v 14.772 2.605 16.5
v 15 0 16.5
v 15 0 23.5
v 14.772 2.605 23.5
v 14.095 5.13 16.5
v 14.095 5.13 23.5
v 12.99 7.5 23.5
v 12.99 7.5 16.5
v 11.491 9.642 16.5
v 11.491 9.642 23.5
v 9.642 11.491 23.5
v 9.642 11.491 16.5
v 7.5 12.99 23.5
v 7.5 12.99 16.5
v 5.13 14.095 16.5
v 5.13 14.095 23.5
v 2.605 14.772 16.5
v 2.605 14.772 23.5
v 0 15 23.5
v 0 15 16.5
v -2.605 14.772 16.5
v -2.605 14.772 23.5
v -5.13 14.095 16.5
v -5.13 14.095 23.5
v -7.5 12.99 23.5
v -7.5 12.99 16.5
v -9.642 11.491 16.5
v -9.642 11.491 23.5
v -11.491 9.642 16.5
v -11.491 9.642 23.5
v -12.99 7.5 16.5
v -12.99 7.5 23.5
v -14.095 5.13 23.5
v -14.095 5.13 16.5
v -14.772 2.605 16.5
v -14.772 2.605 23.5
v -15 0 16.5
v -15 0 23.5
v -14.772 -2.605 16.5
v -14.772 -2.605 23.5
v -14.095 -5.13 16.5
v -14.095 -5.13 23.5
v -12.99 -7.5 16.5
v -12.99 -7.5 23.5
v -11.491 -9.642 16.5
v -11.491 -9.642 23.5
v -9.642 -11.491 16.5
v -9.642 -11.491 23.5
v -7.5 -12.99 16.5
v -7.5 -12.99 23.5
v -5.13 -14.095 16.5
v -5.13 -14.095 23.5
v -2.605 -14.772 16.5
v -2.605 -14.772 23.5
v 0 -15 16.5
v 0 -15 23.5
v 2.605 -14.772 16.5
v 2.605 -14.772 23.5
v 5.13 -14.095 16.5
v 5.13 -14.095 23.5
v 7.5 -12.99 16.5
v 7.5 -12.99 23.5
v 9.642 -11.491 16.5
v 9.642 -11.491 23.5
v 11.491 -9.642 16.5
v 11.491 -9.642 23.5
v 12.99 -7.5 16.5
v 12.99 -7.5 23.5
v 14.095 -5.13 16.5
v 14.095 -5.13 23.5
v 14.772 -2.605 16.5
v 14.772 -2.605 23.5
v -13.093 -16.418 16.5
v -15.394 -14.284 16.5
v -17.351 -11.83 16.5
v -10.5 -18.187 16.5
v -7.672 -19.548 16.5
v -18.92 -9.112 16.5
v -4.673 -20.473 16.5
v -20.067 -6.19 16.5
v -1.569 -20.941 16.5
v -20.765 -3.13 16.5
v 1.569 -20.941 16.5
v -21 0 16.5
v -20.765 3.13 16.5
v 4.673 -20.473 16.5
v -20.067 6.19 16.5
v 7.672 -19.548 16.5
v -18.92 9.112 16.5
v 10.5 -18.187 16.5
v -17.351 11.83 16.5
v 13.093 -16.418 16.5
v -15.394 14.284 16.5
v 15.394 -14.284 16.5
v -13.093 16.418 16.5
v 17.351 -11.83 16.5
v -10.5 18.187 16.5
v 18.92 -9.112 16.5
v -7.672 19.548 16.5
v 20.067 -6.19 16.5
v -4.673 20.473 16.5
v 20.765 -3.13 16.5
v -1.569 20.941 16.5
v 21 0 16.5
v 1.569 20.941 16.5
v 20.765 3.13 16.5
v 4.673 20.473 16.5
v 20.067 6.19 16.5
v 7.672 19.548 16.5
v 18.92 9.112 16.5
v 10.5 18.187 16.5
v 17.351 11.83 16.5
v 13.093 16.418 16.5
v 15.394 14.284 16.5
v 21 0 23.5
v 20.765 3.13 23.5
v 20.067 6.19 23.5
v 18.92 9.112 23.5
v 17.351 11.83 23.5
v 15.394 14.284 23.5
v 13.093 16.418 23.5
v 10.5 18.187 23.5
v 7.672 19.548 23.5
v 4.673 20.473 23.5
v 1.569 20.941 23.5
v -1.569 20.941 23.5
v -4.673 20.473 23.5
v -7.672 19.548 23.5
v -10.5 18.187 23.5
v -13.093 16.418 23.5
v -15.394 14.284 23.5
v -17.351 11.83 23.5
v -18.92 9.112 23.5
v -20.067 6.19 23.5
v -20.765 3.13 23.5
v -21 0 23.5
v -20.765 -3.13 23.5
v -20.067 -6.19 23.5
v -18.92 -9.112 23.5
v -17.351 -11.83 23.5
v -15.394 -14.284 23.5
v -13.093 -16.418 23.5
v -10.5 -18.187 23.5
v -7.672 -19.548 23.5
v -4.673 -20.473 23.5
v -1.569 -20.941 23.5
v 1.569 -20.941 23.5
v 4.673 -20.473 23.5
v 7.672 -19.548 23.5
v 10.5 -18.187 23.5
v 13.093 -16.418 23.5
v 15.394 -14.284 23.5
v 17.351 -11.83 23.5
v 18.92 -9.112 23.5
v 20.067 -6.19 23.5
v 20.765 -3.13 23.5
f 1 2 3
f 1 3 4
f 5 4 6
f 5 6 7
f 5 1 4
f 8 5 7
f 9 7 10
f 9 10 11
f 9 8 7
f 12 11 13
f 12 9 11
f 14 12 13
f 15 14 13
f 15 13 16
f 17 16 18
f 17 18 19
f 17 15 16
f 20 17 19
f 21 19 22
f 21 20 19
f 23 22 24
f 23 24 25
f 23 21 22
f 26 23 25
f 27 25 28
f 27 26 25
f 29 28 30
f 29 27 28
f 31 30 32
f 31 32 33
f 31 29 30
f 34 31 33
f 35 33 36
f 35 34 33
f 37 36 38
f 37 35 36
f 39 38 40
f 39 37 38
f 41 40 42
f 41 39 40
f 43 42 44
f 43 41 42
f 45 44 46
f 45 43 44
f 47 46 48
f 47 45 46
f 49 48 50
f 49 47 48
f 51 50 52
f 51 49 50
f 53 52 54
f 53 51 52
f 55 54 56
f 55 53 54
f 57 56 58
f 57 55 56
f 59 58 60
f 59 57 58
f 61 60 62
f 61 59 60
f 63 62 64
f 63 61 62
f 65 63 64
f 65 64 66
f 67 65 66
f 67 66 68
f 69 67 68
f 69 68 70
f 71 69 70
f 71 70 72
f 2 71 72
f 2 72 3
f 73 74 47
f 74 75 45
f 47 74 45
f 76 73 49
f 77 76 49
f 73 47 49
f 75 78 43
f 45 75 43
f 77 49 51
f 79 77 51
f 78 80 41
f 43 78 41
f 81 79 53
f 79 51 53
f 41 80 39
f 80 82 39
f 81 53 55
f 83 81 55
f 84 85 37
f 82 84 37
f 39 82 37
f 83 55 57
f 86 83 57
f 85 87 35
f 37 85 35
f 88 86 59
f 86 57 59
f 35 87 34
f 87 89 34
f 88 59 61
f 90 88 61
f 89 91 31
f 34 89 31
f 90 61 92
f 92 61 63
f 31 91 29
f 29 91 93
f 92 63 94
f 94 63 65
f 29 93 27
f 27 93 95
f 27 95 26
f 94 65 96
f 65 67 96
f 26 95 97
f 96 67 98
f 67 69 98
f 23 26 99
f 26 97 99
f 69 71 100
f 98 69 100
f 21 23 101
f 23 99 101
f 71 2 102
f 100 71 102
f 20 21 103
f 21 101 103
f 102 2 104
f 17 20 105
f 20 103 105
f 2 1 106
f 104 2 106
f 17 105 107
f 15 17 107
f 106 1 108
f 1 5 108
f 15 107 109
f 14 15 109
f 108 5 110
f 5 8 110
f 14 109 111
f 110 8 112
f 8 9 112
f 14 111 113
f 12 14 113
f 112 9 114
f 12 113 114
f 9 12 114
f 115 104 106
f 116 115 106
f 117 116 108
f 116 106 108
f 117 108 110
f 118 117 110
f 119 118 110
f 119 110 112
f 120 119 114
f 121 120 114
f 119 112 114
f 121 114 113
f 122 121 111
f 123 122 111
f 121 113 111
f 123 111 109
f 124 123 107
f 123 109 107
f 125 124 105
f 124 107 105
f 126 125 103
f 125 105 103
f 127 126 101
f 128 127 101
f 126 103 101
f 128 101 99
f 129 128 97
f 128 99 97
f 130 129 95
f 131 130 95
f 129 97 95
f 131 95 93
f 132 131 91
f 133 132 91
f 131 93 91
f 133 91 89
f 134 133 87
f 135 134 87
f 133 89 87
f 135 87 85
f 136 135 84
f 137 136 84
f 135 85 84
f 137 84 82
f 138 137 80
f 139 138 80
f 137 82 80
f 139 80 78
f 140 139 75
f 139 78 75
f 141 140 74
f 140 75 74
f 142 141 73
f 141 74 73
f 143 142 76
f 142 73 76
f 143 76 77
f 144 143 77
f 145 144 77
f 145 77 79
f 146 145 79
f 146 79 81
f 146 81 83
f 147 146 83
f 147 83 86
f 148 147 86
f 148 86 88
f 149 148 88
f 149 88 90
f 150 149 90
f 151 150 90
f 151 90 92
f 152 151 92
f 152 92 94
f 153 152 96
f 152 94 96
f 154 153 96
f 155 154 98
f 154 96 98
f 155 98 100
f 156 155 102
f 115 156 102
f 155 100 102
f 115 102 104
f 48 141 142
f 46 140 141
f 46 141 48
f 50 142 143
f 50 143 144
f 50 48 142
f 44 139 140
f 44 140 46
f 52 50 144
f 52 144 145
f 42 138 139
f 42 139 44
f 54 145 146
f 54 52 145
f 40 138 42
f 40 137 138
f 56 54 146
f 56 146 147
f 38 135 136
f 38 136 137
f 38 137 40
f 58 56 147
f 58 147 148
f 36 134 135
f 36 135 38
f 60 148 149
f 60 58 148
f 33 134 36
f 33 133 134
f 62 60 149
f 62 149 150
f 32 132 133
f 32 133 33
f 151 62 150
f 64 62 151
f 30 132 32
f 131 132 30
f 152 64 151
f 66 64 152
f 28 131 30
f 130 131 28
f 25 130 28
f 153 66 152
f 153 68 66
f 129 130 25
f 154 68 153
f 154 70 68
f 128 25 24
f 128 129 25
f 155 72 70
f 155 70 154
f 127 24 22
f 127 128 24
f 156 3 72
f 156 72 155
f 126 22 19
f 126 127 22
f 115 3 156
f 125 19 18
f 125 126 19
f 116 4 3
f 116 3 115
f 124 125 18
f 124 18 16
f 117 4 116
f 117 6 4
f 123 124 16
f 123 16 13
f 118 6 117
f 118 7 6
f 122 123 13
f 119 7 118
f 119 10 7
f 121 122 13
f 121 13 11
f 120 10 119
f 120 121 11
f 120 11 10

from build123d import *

# Parameters (mm, degrees)
CYLINDER013_R     = 15
CYLINDER013_DEPTH = 7
CYLINDER012_R     = 21
CYLINDER012_DEPTH = 7


with BuildPart() as bearing_inner:
    # Cylinder013 → Cylinder013 (new body)
    with BuildSketch(Plane.XY):
        Circle(CYLINDER013_R)
    extrude(amount=CYLINDER013_DEPTH)


with BuildPart() as bearing:
    # Cylinder012 → Cylinder012 (new body)
    with BuildSketch(Plane.XY):
        Circle(CYLINDER012_R)
    extrude(amount=CYLINDER012_DEPTH)

    # Cut001: cut bearing inner
    add(bearing_inner.part, mode=Mode.SUBTRACT)


with BuildPart() as bearing_1:
    # Cut001 placement: moved
    add(bearing.part.moved(Location((0, 0, 16.5))))


solid = bearing_1.part
